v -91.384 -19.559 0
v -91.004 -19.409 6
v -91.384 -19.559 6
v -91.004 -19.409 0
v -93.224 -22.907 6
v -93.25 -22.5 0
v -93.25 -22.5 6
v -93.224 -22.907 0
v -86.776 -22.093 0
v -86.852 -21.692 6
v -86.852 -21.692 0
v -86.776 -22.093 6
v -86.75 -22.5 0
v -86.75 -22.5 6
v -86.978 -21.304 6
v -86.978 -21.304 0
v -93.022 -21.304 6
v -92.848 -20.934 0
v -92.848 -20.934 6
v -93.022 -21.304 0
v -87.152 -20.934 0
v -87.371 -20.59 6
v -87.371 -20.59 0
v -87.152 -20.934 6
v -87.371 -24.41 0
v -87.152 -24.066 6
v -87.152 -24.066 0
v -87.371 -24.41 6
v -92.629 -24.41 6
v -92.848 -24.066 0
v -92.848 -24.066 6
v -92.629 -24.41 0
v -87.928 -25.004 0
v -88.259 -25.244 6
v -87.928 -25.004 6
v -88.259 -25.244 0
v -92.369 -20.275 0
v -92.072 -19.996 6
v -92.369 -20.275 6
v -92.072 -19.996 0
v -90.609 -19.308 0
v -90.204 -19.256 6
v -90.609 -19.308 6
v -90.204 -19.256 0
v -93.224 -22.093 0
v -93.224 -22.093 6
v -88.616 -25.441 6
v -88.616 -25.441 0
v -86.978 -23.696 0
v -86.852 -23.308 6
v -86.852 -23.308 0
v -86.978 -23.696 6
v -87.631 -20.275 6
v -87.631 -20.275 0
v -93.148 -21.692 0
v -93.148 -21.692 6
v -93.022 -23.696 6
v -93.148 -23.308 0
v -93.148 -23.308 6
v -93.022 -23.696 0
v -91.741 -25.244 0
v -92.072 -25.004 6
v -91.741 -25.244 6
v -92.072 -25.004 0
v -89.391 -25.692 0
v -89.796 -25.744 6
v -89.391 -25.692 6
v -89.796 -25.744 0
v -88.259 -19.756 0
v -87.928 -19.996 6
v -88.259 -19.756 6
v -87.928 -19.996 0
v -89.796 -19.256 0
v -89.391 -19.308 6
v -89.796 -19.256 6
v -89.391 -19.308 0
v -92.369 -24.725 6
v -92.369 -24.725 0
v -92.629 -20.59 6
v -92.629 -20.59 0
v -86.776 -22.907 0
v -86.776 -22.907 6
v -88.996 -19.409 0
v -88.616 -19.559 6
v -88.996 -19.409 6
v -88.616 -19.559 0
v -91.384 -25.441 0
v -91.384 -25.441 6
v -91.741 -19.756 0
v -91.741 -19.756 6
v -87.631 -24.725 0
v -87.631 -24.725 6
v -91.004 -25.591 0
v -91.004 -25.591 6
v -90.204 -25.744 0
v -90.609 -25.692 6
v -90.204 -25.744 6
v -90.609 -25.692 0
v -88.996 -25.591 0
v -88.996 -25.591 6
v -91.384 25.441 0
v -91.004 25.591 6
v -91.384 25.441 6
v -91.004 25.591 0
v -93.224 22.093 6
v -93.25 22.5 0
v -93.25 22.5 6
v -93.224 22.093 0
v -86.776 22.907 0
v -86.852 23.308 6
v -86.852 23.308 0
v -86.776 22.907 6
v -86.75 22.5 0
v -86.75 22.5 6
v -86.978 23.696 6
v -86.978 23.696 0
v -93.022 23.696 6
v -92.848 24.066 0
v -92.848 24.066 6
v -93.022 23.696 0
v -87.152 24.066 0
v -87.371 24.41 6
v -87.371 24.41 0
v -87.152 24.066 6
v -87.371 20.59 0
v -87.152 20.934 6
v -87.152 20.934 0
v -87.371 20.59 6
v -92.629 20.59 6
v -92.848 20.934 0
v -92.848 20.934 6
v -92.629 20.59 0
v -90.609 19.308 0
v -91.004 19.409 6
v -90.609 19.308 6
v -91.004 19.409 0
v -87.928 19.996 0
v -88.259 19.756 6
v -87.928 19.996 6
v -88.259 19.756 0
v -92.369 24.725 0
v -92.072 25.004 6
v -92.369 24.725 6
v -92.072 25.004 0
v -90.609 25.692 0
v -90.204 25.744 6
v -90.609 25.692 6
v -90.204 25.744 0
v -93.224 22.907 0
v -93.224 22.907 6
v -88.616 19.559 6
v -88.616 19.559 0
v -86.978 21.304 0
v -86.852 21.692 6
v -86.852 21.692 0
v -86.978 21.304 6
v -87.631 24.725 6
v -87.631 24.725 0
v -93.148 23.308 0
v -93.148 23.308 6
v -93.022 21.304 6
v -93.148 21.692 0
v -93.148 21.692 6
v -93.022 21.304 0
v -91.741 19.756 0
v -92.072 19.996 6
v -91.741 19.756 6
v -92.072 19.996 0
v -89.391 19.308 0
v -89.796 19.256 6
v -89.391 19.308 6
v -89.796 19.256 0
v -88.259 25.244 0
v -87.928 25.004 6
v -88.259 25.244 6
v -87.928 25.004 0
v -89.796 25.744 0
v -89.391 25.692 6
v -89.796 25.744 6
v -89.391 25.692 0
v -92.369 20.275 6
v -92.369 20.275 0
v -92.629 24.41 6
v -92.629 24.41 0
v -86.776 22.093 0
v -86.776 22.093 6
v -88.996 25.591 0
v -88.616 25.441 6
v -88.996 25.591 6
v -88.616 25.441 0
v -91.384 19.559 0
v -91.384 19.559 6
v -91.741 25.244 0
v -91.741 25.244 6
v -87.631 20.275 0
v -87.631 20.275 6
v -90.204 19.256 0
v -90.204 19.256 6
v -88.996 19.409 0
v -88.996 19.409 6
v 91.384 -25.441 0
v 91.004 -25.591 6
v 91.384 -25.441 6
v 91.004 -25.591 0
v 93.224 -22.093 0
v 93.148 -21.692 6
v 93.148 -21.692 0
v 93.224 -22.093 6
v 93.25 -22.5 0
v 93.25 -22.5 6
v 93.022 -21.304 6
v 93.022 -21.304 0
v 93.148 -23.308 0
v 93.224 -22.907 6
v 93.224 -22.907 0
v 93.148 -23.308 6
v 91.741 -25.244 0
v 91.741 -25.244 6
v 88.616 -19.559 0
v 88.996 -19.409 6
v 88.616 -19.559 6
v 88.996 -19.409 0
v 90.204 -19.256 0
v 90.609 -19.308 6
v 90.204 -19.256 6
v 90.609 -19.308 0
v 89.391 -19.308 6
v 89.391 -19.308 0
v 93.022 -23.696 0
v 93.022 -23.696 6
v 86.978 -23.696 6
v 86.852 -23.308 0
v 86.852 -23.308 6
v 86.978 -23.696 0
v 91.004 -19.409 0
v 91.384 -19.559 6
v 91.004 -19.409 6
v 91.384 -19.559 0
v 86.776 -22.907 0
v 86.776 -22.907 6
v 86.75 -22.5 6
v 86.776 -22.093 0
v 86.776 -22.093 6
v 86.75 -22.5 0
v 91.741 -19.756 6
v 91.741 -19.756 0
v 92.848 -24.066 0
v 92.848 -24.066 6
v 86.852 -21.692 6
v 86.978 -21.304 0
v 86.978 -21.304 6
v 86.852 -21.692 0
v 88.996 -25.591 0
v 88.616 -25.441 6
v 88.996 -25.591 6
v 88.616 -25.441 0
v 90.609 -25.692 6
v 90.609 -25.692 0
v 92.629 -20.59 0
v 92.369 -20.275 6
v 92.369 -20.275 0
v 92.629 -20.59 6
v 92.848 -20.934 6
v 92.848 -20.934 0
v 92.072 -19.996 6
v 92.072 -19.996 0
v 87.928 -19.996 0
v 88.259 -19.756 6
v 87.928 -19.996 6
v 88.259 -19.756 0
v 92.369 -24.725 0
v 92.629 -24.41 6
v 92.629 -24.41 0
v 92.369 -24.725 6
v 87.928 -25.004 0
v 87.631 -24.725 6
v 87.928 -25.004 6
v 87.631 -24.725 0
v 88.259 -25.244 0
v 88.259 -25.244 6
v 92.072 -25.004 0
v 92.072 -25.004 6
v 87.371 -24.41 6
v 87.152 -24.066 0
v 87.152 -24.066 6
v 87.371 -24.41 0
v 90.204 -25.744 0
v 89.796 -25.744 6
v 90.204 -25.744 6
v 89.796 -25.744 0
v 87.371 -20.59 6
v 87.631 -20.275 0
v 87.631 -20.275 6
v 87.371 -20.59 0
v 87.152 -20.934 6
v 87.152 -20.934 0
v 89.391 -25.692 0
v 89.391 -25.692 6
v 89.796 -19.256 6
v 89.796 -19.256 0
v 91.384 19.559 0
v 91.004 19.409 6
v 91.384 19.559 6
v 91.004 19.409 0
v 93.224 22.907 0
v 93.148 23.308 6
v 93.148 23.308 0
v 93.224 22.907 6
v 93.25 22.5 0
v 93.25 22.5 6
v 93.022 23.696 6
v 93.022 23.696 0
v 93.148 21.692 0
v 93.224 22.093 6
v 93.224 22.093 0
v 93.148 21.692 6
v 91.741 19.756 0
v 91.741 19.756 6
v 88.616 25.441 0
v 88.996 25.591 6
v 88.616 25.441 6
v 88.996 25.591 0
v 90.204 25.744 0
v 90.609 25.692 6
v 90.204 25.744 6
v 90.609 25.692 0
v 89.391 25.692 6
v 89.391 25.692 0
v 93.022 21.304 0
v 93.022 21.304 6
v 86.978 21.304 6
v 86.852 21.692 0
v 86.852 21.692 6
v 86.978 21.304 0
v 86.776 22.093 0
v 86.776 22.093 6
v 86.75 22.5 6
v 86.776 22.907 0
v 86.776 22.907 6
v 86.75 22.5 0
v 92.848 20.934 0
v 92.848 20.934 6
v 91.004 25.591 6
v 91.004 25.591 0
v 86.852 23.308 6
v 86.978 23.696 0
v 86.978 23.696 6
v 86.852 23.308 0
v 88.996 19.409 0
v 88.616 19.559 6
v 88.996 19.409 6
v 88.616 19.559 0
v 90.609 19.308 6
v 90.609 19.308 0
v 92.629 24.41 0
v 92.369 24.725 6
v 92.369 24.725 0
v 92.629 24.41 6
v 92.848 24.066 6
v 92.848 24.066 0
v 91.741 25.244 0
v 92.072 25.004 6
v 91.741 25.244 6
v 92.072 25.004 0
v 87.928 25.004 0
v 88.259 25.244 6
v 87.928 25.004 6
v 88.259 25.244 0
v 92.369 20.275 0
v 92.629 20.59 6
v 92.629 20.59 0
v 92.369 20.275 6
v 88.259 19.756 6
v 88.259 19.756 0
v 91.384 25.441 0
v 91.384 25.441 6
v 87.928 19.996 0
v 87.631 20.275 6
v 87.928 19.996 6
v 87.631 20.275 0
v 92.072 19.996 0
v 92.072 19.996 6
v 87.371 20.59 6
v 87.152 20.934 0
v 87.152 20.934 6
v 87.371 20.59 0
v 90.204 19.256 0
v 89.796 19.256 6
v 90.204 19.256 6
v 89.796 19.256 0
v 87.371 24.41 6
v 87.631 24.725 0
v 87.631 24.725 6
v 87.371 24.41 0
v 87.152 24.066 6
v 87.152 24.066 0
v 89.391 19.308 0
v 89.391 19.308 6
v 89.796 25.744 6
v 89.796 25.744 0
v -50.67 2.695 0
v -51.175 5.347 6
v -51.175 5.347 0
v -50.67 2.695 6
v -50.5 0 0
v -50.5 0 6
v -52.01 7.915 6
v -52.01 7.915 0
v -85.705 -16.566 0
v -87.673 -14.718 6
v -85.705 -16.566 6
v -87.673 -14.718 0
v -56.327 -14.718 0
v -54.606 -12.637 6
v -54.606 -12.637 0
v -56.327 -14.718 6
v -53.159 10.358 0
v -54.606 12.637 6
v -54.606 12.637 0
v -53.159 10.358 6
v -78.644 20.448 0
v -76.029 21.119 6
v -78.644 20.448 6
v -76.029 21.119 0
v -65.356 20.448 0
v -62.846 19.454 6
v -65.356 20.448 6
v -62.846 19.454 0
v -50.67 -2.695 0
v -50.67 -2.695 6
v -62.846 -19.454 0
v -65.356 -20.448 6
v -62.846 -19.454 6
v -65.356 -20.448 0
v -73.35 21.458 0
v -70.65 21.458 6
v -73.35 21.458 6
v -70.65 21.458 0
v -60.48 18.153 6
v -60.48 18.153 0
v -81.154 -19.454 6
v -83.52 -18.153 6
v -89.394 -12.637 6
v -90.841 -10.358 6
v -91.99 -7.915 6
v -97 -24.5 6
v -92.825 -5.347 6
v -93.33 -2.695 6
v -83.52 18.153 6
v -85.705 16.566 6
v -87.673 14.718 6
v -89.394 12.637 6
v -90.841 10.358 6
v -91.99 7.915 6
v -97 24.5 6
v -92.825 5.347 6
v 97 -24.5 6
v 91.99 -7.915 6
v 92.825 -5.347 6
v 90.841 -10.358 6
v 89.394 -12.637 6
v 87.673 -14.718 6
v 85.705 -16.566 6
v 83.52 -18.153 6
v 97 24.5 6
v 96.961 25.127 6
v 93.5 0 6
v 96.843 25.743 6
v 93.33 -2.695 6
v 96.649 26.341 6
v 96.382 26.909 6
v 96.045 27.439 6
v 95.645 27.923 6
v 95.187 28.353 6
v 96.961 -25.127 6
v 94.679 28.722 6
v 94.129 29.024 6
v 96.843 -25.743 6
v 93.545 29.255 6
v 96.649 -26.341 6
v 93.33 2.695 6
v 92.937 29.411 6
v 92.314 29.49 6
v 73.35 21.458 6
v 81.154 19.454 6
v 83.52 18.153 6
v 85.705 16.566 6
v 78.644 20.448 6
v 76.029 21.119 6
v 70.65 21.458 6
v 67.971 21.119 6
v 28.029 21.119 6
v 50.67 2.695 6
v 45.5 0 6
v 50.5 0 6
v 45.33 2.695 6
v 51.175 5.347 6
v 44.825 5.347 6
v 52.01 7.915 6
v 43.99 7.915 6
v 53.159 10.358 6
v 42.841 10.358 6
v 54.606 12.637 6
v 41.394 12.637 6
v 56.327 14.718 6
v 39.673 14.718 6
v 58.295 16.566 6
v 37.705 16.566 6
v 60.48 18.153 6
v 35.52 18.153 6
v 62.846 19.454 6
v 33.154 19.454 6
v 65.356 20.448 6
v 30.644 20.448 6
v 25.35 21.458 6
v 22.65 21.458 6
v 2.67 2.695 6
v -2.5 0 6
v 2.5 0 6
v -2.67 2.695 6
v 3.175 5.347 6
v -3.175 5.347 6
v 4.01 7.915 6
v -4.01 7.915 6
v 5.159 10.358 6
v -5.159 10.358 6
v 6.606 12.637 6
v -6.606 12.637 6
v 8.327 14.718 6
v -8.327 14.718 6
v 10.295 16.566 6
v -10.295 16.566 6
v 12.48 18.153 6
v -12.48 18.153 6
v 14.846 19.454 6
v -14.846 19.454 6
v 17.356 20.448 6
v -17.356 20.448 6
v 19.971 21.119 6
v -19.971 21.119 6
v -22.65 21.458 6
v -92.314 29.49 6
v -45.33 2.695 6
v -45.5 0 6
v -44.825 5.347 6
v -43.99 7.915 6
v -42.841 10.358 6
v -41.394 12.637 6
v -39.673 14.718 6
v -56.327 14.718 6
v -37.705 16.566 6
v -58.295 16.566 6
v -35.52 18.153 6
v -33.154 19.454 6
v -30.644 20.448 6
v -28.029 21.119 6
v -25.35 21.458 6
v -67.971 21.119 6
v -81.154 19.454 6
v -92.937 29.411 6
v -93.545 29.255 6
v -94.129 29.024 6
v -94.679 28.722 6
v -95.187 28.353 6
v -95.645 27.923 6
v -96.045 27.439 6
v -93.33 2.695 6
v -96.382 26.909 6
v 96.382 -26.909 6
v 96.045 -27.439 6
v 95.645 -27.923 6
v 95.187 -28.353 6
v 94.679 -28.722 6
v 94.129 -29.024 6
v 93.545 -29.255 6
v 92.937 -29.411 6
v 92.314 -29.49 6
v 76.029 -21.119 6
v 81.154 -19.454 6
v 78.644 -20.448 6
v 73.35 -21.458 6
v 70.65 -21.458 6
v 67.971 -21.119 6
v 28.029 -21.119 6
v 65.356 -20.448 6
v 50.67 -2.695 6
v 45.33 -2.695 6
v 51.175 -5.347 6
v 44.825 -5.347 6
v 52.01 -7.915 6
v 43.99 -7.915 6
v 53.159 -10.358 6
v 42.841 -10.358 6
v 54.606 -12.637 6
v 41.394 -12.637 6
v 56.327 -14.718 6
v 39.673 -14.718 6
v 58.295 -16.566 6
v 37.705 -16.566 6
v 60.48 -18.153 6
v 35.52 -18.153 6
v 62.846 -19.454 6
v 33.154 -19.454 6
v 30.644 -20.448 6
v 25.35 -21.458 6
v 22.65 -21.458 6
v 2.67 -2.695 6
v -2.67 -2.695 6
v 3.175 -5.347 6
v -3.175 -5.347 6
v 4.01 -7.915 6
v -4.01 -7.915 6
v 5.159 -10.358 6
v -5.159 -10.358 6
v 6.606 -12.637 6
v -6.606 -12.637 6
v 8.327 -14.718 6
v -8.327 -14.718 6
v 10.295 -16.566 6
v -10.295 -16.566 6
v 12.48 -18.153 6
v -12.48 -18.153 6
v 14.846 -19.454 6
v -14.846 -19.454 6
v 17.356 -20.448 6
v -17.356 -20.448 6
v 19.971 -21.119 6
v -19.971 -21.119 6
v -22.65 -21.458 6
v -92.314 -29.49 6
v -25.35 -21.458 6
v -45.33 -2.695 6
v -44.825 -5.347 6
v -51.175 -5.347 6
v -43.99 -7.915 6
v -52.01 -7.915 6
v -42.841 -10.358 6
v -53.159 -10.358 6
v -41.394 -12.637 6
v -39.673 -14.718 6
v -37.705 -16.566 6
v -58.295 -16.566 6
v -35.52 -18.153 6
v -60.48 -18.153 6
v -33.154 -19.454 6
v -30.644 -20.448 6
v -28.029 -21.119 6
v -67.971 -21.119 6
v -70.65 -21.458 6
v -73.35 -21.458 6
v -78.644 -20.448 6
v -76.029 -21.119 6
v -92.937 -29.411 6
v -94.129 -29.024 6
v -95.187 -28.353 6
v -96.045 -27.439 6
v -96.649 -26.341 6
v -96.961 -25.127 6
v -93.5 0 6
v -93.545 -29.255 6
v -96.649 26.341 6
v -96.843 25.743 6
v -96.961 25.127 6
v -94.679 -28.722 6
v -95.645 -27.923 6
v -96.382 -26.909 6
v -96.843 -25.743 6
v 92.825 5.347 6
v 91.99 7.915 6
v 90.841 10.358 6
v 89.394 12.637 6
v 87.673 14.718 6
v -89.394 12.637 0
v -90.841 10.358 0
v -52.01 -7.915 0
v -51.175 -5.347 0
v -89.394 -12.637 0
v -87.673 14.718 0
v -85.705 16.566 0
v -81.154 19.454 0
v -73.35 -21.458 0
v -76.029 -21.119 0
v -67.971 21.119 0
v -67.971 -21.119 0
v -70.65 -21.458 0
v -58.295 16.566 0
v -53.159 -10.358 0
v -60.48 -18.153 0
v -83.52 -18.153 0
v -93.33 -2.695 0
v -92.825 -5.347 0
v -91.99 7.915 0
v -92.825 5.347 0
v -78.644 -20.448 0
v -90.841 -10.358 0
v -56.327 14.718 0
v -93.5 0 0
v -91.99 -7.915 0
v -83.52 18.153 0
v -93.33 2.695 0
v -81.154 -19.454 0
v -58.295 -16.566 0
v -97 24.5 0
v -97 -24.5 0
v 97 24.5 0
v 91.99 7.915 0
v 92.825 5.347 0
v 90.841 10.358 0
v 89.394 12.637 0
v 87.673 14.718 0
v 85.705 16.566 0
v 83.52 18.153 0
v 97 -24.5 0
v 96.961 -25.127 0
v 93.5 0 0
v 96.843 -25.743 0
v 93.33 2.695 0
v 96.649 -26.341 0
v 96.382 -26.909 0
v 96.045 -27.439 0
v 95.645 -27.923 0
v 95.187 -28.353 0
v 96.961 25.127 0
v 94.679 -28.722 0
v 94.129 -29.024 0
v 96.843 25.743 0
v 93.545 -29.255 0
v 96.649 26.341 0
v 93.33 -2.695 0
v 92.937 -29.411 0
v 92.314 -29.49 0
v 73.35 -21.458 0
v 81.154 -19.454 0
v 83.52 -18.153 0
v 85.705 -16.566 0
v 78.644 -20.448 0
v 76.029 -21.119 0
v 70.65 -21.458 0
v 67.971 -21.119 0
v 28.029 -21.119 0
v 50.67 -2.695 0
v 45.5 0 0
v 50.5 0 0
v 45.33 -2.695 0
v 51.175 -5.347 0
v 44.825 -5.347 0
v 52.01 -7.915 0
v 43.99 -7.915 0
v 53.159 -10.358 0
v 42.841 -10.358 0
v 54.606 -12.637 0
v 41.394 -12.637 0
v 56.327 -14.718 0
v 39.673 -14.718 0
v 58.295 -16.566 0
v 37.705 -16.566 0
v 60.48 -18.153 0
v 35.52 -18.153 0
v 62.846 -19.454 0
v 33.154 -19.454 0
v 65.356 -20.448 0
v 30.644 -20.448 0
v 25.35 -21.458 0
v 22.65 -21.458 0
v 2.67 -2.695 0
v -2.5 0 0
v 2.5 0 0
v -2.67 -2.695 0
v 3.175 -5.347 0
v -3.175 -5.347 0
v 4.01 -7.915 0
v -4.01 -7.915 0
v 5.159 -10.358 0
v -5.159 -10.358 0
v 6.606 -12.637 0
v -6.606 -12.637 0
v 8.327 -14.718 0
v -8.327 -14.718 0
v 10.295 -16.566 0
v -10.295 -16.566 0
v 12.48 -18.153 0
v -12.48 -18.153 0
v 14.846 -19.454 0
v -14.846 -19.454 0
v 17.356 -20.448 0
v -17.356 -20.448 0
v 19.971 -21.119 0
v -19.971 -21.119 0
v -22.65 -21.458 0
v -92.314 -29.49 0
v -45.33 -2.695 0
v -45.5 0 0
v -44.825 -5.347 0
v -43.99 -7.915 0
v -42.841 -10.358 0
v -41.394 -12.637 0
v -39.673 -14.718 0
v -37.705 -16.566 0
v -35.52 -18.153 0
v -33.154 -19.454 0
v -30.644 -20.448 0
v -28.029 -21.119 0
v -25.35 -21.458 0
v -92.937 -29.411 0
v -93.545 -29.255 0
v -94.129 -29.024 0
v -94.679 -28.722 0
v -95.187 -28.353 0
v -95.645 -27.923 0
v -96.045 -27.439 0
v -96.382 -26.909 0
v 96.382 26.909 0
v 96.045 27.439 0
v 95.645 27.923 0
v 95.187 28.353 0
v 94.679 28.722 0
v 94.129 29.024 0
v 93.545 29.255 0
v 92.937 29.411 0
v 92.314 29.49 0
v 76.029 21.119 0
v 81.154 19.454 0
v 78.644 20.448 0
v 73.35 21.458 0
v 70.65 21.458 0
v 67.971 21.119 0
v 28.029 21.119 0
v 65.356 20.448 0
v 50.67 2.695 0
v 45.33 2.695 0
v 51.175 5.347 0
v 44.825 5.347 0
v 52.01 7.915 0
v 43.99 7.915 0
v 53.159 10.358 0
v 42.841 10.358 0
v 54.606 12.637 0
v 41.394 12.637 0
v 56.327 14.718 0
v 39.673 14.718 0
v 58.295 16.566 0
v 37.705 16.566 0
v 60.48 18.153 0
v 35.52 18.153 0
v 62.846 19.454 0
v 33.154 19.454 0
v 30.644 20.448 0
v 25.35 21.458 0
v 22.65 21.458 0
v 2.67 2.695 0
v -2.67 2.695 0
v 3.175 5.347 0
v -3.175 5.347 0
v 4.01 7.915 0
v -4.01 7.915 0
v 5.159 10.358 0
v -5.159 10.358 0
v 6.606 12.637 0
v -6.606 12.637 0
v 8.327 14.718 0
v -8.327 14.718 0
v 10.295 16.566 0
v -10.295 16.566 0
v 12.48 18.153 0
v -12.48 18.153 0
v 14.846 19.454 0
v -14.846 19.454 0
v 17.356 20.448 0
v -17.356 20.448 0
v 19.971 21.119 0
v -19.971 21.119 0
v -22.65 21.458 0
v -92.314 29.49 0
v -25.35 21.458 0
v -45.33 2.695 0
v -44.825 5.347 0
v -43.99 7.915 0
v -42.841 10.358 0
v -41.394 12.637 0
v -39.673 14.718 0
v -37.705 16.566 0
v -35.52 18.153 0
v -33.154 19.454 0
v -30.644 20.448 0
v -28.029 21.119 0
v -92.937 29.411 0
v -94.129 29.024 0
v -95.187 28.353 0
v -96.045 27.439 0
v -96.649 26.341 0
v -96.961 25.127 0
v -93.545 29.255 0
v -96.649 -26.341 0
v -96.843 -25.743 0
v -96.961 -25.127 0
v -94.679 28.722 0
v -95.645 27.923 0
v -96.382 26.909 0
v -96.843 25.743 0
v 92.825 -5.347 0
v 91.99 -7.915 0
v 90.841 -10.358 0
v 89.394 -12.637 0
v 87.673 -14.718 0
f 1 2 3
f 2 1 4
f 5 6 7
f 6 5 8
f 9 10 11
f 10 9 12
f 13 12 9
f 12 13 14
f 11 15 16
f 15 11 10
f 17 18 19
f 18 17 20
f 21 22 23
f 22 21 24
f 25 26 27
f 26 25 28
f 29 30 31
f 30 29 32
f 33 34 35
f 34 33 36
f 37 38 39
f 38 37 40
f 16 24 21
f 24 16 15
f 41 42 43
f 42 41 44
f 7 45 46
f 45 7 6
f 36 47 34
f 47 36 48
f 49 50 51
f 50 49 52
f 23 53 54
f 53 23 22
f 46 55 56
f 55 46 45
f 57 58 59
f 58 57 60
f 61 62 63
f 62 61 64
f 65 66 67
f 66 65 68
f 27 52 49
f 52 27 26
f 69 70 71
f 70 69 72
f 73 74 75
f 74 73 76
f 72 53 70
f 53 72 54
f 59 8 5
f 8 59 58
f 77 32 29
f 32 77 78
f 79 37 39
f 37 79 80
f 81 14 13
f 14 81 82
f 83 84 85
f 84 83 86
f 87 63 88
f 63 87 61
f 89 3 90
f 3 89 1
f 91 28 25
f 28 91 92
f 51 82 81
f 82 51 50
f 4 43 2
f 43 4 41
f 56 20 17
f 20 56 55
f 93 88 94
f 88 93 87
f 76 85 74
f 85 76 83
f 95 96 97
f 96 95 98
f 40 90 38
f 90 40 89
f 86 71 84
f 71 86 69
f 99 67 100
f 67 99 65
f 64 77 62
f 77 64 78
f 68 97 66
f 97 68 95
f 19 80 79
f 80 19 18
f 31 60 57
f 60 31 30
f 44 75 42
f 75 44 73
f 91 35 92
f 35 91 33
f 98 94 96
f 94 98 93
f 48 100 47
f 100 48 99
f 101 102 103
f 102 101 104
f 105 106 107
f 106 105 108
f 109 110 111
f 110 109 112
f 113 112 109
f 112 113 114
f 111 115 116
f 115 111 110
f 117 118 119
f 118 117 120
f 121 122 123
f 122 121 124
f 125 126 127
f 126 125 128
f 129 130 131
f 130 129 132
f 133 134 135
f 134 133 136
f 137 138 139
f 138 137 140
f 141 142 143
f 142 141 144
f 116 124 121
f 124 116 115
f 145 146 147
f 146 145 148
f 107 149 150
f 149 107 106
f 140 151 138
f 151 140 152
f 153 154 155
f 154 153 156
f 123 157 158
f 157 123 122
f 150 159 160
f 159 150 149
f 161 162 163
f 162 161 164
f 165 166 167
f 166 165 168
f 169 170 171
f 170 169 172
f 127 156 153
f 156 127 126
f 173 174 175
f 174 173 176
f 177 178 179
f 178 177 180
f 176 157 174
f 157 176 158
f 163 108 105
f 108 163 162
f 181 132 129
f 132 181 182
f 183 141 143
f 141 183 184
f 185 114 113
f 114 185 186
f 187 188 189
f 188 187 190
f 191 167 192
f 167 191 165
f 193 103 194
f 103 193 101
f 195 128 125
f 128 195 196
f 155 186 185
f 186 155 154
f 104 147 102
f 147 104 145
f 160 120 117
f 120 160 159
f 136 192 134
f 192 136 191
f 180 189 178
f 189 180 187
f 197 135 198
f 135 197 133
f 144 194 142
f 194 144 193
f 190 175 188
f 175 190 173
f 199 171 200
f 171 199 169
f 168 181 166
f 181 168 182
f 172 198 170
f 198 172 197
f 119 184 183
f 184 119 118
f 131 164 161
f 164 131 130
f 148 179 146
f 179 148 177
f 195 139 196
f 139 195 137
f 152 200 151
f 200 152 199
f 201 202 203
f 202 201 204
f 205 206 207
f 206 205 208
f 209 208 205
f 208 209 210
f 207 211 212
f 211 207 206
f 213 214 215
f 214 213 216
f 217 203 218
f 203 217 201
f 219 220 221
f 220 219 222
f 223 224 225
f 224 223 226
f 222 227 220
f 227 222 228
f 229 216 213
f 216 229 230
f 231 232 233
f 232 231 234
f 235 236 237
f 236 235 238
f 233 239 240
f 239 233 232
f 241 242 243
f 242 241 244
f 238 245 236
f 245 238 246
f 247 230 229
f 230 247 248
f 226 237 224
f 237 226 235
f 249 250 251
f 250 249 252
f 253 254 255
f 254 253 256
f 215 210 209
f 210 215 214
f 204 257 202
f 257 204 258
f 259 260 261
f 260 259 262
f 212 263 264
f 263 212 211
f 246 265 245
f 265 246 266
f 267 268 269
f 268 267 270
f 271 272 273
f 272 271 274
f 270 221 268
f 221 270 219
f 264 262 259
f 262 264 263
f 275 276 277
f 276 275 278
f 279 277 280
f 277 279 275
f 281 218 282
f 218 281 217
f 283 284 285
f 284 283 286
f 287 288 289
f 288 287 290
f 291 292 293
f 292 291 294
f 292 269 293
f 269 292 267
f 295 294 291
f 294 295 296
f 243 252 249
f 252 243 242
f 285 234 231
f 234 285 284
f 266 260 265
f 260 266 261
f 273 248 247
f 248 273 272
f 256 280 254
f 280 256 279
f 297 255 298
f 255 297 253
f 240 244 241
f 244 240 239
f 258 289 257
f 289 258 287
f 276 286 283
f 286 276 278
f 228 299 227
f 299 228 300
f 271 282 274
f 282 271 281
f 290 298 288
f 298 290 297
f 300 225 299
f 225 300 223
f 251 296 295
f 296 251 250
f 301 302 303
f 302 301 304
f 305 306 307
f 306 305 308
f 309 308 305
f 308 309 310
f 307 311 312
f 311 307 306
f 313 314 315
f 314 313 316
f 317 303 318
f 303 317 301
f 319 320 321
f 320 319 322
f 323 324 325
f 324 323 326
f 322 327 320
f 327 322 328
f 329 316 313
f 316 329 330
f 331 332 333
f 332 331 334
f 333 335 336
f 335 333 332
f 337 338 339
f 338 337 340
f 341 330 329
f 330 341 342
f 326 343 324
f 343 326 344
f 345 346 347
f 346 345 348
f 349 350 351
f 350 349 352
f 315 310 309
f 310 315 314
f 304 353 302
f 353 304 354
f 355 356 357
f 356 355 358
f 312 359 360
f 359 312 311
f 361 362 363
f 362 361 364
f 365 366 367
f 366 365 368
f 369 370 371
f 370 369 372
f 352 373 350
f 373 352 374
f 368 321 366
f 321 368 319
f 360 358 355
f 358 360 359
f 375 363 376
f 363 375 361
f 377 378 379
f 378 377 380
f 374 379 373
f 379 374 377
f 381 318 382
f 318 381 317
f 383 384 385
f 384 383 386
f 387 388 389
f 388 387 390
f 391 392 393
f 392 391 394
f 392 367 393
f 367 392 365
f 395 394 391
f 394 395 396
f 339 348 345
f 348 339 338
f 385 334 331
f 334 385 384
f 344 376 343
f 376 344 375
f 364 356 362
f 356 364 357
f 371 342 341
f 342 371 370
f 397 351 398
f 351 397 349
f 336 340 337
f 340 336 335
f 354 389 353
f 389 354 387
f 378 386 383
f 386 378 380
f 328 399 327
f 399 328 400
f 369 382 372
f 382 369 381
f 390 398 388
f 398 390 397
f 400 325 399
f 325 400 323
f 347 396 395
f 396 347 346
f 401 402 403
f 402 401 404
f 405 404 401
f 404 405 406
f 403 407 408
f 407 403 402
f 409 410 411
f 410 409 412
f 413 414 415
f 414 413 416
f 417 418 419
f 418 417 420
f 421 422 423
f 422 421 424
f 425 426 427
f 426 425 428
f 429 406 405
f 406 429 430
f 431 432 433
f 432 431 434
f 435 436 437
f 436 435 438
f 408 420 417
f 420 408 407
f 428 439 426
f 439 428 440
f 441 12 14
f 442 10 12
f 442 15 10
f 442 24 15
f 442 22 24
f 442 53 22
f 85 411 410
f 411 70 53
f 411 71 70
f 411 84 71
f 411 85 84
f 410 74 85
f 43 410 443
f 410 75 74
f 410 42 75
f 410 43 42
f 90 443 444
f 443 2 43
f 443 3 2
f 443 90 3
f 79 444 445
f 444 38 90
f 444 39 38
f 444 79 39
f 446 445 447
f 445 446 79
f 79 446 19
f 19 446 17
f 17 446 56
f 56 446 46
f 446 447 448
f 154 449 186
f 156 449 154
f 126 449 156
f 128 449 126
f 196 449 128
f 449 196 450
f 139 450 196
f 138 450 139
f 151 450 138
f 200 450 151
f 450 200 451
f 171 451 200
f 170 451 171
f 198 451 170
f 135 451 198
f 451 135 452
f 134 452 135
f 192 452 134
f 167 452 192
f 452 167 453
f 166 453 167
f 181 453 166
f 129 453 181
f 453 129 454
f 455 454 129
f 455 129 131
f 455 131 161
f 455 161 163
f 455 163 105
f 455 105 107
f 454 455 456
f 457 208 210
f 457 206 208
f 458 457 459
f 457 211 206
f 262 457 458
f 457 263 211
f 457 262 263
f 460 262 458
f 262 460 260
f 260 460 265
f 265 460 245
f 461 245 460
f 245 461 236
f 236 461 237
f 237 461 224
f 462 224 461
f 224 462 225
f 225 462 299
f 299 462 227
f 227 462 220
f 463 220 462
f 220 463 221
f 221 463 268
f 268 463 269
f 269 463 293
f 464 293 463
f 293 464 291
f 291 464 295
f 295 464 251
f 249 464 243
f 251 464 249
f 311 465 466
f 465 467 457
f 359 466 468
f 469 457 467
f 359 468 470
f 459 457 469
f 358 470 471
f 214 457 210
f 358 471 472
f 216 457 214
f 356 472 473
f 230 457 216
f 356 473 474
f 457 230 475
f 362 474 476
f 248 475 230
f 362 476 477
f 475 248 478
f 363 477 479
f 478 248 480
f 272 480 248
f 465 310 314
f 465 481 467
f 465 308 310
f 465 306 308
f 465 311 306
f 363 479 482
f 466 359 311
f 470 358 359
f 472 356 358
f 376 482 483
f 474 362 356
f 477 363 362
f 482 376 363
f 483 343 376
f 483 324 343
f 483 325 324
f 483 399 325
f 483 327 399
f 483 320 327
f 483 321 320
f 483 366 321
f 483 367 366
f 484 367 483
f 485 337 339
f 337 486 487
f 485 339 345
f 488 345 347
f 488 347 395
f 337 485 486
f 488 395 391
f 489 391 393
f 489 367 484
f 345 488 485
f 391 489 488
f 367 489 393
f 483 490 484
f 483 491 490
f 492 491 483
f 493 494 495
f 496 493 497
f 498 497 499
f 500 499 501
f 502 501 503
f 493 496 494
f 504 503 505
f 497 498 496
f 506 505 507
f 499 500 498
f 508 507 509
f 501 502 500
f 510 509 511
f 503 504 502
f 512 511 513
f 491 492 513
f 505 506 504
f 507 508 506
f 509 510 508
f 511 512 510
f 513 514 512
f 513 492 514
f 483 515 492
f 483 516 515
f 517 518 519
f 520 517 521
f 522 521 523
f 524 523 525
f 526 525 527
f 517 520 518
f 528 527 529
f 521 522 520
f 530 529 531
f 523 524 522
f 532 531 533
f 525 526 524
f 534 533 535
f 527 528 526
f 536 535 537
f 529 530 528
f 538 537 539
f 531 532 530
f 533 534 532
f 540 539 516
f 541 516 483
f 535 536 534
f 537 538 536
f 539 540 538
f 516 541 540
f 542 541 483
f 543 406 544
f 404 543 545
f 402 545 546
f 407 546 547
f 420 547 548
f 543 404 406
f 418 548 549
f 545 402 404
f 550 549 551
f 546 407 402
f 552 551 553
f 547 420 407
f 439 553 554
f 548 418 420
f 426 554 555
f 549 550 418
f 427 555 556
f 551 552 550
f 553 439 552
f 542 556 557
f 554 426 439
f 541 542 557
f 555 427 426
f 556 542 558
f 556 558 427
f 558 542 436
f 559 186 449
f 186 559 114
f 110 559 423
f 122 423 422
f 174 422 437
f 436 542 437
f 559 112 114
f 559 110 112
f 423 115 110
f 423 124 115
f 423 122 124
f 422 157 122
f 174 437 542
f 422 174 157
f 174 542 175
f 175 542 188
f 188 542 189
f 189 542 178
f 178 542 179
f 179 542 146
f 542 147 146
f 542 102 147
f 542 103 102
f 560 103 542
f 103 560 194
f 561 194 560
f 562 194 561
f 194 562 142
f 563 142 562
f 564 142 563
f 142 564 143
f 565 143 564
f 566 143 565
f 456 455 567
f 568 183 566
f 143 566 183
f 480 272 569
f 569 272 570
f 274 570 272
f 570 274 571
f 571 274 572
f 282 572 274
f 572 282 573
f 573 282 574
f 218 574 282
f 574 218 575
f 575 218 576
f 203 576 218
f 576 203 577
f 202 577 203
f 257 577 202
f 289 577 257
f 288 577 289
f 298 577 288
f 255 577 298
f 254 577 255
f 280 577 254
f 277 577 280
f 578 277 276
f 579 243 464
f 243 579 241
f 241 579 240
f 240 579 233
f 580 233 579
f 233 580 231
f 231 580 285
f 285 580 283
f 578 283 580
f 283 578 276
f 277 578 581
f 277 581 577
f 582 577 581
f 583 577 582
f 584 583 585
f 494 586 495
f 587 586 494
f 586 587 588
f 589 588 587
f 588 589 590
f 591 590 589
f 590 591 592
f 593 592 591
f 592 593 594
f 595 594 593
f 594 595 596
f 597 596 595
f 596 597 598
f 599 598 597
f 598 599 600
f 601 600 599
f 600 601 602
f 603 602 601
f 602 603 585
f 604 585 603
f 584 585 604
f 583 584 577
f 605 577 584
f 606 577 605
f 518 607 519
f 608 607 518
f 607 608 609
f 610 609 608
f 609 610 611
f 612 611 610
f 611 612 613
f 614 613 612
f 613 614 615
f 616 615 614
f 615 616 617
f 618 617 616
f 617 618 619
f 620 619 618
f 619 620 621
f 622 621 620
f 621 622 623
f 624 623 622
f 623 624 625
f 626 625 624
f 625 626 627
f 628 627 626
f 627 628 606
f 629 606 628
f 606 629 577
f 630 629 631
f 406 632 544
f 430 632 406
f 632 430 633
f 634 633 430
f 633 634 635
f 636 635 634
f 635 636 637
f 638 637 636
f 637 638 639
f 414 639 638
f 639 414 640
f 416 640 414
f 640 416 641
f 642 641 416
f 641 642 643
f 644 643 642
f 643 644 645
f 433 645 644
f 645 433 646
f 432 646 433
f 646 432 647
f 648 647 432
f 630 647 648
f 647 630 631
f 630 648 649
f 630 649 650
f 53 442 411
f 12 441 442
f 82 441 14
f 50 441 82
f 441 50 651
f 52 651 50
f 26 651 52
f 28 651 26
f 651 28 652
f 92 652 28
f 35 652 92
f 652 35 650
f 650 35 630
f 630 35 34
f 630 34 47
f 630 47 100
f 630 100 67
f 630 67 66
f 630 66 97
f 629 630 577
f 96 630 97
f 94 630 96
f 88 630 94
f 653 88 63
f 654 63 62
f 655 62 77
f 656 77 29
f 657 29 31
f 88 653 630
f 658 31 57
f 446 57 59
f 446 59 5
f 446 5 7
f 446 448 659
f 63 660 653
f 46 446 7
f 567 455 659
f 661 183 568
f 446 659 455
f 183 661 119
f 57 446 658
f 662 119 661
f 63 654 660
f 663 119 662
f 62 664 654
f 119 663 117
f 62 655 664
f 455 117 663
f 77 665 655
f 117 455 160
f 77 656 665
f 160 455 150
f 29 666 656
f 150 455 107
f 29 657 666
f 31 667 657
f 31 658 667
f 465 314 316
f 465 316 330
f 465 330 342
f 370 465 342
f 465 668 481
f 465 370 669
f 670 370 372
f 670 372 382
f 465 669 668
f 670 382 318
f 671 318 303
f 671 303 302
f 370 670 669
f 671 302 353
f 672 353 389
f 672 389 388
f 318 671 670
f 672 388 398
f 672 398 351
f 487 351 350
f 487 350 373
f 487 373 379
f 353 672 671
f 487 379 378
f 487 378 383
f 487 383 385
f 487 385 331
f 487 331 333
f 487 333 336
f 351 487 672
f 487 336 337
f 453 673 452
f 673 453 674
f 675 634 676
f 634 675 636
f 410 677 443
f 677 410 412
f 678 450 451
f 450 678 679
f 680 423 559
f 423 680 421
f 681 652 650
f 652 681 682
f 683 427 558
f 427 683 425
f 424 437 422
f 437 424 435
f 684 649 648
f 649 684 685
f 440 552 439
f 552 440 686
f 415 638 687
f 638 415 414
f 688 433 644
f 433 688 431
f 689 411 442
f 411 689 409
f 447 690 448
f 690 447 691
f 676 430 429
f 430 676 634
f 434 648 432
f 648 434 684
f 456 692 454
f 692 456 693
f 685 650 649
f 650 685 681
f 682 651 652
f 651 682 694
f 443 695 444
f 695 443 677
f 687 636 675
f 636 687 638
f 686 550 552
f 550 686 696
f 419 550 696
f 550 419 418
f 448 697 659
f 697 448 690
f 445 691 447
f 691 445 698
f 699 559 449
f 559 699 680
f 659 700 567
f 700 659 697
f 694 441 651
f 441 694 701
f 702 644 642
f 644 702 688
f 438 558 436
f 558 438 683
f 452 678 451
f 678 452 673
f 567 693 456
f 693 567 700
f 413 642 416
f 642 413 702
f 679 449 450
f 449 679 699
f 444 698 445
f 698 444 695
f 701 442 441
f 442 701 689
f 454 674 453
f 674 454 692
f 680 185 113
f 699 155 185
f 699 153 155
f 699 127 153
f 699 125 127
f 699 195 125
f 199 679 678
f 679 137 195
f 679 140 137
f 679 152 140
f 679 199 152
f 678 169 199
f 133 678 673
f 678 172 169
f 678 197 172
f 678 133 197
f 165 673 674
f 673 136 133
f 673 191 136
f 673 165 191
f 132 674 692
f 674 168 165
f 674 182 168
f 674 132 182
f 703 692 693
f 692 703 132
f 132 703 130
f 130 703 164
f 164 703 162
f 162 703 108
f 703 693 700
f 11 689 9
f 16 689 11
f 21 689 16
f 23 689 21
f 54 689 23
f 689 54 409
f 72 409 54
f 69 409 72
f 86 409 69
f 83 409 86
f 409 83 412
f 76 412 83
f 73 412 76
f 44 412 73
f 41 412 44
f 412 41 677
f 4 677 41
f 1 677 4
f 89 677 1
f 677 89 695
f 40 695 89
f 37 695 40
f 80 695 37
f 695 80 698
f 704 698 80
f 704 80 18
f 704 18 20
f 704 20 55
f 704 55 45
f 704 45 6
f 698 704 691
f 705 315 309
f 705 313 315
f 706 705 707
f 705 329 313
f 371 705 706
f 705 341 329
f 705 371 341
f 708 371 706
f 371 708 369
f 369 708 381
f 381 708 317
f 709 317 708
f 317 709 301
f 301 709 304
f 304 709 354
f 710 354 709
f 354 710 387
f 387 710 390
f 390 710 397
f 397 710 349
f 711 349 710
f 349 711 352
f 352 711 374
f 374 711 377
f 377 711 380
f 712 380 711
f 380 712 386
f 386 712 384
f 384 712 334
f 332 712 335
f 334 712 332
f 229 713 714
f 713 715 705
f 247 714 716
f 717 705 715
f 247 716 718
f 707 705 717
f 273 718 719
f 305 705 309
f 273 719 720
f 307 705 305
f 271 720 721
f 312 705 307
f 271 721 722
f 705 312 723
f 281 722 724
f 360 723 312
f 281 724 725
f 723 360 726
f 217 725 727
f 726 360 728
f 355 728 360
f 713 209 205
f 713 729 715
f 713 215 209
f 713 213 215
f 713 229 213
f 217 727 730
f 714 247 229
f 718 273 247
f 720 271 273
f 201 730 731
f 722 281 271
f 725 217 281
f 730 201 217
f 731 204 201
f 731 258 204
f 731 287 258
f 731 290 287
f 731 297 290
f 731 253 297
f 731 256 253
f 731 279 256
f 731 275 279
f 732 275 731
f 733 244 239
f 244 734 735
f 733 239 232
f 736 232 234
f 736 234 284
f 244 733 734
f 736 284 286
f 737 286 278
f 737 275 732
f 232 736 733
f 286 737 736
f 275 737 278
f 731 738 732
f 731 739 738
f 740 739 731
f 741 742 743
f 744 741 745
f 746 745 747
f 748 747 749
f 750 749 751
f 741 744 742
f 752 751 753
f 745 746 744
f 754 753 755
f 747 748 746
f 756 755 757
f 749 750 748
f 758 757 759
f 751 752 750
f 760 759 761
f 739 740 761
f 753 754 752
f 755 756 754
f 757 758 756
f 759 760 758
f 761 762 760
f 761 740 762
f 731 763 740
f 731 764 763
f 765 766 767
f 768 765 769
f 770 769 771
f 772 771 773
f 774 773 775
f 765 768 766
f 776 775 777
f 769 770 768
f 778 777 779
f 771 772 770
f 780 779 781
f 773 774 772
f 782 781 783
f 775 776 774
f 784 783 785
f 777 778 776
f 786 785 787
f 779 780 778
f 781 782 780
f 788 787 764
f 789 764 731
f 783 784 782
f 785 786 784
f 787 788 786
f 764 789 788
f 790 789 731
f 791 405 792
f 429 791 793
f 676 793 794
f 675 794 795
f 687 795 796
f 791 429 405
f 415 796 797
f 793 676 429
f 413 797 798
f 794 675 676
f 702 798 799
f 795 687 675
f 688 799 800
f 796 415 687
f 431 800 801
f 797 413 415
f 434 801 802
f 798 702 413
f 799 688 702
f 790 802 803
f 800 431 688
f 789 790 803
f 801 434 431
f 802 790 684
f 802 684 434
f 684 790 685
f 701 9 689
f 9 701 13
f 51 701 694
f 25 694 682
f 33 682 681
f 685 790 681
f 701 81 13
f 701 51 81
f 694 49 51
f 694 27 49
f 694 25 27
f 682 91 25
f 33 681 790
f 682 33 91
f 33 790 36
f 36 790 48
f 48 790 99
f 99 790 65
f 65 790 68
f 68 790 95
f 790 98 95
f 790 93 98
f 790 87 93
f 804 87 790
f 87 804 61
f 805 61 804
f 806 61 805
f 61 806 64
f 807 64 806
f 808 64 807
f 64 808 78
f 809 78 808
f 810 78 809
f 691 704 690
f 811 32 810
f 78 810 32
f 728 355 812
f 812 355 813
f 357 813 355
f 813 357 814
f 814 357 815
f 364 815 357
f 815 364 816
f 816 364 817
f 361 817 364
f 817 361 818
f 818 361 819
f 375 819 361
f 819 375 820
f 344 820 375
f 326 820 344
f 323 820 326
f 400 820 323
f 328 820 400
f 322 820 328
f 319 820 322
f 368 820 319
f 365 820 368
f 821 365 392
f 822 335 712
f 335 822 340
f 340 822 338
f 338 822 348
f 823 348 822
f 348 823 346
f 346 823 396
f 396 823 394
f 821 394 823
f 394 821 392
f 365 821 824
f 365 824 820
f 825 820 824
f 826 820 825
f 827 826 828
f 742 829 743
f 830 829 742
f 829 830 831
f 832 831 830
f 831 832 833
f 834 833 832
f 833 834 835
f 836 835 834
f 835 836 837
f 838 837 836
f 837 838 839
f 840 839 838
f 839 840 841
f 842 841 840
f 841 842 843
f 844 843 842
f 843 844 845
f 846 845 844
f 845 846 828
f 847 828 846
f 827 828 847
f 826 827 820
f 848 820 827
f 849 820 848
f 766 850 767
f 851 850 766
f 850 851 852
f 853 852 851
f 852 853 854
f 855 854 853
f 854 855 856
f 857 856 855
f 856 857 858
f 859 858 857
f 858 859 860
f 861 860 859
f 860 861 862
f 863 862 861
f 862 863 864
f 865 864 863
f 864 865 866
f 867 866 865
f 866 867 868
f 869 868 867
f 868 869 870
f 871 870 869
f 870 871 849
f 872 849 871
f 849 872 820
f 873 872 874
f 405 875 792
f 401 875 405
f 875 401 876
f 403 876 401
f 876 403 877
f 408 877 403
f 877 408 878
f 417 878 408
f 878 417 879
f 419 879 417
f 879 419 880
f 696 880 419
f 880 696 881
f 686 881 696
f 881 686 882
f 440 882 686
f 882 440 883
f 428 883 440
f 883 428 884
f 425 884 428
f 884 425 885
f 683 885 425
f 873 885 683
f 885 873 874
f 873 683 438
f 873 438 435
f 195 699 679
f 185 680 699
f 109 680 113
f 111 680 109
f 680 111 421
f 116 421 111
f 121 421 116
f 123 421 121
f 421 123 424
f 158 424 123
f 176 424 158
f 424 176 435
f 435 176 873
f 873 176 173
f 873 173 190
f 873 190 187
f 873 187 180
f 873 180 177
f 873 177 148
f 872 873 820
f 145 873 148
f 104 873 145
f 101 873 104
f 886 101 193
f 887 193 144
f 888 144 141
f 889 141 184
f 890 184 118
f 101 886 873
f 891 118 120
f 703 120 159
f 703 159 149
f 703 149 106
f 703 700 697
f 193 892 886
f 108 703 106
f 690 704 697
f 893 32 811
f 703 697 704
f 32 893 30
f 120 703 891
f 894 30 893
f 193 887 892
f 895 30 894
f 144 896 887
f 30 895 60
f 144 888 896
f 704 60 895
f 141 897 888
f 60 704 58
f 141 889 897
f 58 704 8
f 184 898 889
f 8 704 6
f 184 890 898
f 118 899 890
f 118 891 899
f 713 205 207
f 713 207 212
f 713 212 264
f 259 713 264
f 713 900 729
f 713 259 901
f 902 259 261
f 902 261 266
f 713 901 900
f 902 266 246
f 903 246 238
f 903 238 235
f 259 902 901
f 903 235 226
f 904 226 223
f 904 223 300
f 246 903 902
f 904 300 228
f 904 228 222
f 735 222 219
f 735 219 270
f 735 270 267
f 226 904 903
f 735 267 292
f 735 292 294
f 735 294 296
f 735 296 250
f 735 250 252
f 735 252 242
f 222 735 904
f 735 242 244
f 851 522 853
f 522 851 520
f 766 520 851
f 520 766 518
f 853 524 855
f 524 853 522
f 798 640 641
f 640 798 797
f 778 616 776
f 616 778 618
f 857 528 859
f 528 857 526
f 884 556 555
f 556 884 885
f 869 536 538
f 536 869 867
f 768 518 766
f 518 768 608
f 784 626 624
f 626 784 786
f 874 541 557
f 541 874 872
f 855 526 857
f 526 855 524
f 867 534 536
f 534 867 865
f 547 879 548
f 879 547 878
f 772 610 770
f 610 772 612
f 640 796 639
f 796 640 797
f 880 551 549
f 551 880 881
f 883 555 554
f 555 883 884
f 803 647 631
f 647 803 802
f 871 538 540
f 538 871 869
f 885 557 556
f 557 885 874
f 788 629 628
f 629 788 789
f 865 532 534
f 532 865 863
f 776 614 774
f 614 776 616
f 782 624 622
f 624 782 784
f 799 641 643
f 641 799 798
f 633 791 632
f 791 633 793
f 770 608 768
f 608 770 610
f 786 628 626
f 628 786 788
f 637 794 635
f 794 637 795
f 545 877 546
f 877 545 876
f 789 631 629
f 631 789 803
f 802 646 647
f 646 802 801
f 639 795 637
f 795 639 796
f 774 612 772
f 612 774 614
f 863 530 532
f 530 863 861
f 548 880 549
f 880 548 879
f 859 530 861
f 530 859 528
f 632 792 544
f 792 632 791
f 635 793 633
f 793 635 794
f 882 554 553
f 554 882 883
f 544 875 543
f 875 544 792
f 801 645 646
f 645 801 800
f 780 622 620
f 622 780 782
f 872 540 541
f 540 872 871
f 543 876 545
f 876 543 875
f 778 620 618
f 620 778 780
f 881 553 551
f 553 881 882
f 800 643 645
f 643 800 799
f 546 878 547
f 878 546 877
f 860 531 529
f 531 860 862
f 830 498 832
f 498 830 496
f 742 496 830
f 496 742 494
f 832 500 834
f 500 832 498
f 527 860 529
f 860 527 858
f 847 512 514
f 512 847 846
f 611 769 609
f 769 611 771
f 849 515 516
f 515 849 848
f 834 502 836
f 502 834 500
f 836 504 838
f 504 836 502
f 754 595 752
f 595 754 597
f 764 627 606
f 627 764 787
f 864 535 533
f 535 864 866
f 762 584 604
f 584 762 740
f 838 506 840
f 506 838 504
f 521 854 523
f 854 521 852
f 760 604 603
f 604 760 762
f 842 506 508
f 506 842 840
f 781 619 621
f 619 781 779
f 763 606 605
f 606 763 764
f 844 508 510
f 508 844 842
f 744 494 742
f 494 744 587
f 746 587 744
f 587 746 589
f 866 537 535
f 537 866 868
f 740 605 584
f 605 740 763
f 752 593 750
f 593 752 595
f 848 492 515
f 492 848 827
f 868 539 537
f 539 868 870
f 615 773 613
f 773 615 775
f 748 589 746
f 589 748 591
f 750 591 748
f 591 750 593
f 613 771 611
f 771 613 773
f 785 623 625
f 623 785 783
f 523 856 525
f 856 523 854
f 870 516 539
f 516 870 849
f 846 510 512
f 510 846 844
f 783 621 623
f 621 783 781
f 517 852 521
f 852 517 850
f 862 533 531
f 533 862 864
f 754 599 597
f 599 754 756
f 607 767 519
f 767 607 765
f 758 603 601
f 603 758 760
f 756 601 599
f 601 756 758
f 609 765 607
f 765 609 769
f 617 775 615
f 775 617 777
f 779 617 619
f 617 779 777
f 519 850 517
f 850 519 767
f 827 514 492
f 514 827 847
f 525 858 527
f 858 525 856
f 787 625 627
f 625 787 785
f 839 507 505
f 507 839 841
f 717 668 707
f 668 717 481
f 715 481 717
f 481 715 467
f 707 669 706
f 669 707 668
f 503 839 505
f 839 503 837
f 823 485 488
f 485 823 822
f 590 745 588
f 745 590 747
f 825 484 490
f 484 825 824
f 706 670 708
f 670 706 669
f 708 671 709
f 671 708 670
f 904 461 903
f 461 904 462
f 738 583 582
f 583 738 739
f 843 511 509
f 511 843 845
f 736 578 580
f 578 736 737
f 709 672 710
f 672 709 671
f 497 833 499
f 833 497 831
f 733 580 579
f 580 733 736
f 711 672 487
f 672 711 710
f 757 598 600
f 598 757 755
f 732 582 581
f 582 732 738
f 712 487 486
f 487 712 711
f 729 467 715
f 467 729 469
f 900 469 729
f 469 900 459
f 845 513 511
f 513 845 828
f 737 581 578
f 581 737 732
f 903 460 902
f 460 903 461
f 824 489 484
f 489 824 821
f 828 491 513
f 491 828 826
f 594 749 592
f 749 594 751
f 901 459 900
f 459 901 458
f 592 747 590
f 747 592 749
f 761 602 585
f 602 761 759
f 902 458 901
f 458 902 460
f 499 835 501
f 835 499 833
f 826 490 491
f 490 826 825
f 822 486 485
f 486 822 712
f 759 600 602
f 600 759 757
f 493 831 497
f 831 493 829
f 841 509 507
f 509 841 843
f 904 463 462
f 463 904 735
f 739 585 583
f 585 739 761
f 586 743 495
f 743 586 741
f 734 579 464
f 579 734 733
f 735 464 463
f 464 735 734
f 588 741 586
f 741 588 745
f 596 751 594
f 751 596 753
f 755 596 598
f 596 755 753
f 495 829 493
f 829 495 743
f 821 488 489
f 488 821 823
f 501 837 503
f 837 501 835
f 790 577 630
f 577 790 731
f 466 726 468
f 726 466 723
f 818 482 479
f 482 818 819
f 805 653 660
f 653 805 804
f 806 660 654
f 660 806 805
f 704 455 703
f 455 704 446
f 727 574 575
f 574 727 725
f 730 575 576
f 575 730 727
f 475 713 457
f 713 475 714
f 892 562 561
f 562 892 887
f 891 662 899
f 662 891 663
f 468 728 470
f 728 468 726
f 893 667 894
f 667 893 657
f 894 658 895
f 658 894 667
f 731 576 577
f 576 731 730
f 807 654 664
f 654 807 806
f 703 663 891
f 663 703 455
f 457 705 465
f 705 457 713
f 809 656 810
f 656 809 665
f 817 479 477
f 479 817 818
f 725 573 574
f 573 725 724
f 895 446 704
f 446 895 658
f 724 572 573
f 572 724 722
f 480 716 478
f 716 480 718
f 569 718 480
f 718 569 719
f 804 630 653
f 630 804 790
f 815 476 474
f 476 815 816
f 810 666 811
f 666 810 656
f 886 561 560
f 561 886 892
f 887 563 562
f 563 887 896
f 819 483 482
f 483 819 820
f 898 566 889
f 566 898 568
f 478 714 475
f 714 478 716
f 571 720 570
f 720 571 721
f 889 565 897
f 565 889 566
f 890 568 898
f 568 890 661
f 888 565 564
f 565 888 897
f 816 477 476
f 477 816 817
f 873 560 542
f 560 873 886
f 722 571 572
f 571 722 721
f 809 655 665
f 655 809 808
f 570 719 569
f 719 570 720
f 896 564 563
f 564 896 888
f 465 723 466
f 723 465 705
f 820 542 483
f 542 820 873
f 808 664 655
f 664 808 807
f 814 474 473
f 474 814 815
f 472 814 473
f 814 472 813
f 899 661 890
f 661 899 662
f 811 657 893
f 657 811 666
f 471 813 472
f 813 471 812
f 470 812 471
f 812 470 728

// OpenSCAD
$fn = 50;


difference() {
	union() {
		hull() {
			translate(v = [-92.0000000000, 24.5000000000, 0]) {
				cylinder(h = 6, r = 5);
			}
			translate(v = [92.0000000000, 24.5000000000, 0]) {
				cylinder(h = 6, r = 5);
			}
			translate(v = [-92.0000000000, -24.5000000000, 0]) {
				cylinder(h = 6, r = 5);
			}
			translate(v = [92.0000000000, -24.5000000000, 0]) {
				cylinder(h = 6, r = 5);
			}
		}
	}
	union() {
		#translate(v = [-90.0000000000, -22.5000000000, -100.0000000000]) {
			cylinder(h = 200, r = 3.2500000000);
		}
		#translate(v = [-90.0000000000, 22.5000000000, -100.0000000000]) {
			cylinder(h = 200, r = 3.2500000000);
		}
		#translate(v = [90.0000000000, -22.5000000000, -100.0000000000]) {
			cylinder(h = 200, r = 3.2500000000);
		}
		#translate(v = [90.0000000000, 22.5000000000, -100.0000000000]) {
			cylinder(h = 200, r = 3.2500000000);
		}
		#translate(v = [-72.0000000000, 0, 0]) {
			cylinder(h = 6, r = 21.5000000000);
		}
		#translate(v = [-24.0000000000, 0, 0]) {
			cylinder(h = 6, r = 21.5000000000);
		}
		#translate(v = [24.0000000000, 0, 0]) {
			cylinder(h = 6, r = 21.5000000000);
		}
		#translate(v = [72.0000000000, 0, 0]) {
			cylinder(h = 6, r = 21.5000000000);
		}
	}
}
